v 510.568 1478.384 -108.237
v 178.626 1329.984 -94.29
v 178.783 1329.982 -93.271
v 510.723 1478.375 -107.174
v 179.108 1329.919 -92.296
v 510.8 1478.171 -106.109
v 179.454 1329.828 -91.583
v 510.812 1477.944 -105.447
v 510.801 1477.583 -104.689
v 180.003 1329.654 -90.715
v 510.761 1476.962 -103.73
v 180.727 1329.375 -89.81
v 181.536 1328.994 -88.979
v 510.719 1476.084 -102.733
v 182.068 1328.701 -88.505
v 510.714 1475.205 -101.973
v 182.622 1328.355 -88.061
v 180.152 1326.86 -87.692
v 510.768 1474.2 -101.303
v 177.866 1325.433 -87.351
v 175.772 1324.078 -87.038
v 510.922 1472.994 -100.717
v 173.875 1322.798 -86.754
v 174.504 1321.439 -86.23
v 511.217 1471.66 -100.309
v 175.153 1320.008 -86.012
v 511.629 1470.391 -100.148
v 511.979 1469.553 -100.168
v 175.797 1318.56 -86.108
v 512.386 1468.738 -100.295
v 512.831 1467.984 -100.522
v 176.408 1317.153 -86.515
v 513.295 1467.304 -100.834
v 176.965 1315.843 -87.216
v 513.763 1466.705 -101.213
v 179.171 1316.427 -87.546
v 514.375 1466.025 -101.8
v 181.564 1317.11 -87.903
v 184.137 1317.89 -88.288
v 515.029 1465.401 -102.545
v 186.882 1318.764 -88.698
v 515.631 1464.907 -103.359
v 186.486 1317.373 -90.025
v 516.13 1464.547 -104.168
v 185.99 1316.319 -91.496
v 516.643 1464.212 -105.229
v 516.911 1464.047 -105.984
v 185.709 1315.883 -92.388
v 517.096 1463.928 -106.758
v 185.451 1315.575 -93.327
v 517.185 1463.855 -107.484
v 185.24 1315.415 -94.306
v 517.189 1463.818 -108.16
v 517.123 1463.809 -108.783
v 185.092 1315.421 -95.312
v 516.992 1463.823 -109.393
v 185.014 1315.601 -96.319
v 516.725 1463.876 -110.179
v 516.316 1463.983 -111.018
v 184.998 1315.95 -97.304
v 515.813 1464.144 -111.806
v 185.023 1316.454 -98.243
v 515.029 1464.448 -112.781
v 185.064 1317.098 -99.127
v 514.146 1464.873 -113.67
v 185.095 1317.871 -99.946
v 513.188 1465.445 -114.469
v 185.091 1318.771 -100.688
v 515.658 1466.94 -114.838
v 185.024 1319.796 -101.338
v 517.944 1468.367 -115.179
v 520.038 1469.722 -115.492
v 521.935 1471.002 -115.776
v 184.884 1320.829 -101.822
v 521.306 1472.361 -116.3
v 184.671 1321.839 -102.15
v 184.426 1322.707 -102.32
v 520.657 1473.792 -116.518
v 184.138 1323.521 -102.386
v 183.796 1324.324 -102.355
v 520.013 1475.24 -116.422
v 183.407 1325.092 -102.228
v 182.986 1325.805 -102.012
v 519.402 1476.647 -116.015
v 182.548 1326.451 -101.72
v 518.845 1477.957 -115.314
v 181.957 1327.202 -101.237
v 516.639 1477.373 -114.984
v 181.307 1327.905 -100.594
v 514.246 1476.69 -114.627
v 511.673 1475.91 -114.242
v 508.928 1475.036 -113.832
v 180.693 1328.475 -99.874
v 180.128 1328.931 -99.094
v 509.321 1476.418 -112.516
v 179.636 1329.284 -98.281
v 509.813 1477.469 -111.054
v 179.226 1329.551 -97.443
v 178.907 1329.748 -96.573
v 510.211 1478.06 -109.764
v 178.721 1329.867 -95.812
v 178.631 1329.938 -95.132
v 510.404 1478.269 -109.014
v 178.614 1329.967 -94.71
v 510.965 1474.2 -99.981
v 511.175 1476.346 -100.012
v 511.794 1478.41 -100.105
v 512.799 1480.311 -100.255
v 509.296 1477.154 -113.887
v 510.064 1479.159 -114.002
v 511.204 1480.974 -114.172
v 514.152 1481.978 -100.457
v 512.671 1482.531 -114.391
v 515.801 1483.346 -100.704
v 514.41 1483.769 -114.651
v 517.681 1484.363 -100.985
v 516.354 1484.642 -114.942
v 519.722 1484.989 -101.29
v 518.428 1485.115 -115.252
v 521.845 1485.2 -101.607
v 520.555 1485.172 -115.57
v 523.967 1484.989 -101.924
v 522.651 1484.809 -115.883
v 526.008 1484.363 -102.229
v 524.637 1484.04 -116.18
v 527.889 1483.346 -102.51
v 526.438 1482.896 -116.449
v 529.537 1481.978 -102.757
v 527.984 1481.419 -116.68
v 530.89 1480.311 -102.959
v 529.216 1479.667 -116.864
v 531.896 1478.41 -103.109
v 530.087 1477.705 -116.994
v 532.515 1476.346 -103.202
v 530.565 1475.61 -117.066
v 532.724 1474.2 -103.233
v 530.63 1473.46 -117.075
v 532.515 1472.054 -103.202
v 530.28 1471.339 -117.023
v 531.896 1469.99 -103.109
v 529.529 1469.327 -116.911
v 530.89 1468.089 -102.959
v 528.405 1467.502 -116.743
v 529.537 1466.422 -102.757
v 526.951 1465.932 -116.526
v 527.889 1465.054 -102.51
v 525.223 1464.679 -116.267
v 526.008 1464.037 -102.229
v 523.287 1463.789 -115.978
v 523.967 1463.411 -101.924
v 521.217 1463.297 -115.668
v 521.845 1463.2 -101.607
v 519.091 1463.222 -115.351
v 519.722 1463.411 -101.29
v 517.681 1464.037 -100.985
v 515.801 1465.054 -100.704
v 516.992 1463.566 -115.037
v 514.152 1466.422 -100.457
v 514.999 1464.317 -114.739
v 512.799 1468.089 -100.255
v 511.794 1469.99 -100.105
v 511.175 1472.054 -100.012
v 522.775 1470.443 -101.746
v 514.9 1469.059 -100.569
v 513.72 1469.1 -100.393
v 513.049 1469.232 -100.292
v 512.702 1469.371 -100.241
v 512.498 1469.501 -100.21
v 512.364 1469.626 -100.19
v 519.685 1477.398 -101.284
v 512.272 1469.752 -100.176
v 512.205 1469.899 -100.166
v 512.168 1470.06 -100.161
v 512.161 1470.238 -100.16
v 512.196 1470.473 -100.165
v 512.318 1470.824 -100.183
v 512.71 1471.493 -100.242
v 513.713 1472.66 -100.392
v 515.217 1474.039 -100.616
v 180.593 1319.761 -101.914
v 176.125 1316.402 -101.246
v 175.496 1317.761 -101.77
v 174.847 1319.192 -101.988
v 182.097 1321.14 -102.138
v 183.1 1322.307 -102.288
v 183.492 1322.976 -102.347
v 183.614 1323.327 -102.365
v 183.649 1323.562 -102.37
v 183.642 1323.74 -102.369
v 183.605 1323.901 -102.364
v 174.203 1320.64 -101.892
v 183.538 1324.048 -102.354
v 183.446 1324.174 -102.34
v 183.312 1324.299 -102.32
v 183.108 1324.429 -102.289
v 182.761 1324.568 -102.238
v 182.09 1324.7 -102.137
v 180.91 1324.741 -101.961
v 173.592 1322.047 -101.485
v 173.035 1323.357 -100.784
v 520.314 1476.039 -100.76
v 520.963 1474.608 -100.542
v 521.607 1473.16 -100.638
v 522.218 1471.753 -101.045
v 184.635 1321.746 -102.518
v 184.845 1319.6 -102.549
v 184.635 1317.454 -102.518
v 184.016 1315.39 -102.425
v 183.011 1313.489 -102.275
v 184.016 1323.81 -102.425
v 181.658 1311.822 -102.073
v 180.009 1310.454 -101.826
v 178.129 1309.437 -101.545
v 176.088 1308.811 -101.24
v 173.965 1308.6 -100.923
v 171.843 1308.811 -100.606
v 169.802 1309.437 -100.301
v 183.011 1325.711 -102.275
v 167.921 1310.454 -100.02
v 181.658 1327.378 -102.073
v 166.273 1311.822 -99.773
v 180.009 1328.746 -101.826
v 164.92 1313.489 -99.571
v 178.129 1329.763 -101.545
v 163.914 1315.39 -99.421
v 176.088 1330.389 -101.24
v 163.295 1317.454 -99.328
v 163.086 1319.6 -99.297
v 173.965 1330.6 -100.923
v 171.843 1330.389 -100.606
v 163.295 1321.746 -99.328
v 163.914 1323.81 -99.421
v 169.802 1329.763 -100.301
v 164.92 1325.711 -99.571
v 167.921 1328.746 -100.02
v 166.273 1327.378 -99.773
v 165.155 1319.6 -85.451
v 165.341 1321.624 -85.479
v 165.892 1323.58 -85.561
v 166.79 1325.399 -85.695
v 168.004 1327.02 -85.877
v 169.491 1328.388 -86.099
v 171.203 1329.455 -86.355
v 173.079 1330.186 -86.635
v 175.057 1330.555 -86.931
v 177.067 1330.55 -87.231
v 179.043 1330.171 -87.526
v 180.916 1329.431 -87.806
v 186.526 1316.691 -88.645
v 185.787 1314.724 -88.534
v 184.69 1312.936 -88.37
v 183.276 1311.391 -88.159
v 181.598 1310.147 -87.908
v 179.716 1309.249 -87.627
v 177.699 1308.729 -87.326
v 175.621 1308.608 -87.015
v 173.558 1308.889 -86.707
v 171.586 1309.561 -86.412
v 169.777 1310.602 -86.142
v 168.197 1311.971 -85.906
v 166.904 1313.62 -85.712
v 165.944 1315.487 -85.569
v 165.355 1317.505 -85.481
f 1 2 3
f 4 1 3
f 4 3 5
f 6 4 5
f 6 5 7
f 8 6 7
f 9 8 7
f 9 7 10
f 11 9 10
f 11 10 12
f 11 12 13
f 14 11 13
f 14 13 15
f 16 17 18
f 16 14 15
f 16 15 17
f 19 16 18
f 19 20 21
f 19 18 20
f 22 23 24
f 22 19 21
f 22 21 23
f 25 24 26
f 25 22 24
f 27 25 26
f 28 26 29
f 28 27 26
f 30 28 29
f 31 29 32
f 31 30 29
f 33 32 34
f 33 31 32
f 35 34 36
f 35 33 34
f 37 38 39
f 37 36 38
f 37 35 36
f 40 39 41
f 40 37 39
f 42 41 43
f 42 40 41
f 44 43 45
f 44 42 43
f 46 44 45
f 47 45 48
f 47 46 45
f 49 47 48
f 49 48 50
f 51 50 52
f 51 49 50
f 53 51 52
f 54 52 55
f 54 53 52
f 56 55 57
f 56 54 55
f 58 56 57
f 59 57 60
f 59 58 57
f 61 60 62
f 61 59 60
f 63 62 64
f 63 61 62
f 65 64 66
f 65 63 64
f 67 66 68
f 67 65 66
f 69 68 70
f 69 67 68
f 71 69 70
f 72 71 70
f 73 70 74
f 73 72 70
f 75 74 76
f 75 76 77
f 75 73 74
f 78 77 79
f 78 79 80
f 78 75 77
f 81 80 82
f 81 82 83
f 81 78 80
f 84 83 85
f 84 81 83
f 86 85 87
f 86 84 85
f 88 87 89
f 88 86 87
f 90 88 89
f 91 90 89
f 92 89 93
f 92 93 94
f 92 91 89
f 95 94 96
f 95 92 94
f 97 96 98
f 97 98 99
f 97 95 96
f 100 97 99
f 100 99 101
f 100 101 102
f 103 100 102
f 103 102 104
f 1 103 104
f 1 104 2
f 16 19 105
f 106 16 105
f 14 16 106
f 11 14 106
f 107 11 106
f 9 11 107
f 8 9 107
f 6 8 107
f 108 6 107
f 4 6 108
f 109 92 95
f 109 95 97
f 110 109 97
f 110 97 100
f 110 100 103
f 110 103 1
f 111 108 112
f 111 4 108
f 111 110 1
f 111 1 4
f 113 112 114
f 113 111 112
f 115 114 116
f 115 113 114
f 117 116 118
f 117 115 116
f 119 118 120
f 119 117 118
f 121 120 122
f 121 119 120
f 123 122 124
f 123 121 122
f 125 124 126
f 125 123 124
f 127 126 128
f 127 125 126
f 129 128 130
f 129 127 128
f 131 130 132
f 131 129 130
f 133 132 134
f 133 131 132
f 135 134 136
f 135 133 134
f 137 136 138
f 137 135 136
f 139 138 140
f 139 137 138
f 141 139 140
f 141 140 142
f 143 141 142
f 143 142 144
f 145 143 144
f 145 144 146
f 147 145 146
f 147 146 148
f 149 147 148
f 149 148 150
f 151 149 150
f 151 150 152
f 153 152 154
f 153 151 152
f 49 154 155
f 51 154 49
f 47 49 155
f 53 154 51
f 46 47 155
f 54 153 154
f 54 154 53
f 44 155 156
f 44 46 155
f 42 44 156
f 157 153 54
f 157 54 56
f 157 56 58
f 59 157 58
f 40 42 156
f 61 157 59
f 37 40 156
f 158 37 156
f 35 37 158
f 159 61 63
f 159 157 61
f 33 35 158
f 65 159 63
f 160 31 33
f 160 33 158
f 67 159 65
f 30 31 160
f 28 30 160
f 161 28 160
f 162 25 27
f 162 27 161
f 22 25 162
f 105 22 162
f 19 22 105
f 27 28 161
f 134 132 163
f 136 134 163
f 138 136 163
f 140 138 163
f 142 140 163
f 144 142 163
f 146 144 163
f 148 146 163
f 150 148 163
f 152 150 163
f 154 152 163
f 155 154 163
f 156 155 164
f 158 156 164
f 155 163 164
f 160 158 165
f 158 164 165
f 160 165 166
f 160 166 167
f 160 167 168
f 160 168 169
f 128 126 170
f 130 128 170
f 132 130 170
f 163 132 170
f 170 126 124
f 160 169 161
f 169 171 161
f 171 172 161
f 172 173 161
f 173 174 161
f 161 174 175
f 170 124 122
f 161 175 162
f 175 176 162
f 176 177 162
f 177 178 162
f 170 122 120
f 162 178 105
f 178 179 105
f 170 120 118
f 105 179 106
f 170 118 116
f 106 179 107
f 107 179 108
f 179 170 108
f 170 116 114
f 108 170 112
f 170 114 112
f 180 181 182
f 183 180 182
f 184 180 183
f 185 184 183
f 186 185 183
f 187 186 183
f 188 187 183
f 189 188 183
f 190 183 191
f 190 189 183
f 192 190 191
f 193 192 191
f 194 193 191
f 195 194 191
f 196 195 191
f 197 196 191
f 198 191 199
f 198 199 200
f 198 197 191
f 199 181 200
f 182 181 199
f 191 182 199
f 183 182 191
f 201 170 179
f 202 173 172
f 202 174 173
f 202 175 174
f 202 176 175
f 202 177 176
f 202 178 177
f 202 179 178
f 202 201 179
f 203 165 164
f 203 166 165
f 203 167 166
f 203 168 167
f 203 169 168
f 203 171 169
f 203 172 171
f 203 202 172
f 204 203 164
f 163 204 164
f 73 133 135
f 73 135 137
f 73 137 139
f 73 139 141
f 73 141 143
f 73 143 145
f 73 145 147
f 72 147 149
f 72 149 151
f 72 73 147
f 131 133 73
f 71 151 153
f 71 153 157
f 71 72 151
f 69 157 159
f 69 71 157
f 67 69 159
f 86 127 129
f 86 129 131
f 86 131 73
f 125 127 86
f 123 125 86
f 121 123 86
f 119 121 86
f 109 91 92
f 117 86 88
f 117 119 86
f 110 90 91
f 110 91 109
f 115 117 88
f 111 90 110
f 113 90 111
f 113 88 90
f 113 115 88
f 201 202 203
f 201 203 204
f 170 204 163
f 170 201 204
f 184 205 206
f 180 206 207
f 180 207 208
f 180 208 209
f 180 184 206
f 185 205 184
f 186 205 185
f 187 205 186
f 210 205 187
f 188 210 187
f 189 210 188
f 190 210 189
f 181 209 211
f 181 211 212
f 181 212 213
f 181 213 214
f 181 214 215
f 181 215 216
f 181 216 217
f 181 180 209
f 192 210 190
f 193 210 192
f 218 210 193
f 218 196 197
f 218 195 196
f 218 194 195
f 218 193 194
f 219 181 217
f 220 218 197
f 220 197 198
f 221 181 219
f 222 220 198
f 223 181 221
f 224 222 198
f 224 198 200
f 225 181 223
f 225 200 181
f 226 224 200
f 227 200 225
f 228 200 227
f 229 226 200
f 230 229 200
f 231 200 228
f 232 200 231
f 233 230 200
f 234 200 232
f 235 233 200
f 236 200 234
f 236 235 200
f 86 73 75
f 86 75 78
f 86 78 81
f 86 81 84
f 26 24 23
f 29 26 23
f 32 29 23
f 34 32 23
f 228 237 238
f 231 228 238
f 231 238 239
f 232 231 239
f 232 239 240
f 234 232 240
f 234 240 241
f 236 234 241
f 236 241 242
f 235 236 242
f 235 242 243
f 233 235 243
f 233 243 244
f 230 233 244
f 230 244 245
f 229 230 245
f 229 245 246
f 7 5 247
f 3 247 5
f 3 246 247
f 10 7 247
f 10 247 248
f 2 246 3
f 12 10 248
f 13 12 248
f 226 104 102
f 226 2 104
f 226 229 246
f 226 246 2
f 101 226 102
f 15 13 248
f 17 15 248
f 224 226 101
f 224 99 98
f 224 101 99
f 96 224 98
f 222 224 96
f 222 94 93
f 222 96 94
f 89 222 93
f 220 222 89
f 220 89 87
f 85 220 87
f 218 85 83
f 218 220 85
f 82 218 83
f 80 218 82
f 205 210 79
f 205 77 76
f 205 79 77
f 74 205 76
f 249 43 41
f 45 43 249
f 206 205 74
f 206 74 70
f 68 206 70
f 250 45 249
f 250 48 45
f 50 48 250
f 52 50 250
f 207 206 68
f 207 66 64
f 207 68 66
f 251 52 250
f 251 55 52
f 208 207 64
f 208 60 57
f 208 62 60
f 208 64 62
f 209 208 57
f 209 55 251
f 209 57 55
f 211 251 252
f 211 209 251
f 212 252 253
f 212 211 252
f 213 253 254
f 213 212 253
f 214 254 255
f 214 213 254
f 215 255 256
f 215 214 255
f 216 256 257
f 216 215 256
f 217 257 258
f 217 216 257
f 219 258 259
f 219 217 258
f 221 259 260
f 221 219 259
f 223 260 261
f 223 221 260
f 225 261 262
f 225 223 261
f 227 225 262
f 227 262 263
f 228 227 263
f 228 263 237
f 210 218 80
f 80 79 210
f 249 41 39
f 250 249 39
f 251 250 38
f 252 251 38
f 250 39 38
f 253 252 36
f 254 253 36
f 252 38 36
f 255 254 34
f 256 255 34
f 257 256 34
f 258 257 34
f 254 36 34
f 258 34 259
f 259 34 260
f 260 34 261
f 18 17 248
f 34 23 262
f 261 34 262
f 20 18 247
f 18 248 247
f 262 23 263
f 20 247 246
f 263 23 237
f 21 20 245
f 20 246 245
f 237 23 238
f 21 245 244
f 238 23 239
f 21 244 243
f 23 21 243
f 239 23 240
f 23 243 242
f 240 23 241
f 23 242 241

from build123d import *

# Parameters (mm, degrees)
SUSP_RR_TOE_LINK_PROFILE_R             = 8
SUSP_RR_TOE_LINK_ROD_END_IN_PROFILE_R  = 11
SUSP_RR_TOE_LINK_ROD_END_OUT_PROFILE_R = 11


with BuildPart() as part:
    # SUSP_RR_toe_link: sweep along a curve in space
    with BuildLine() as susp_rr_toe_link_path:
        Line((175, 1319.6, -94), (520.81, 1474.2, -108.53))
    # SUSP_RR_toe_link profile (on start of the path) → SUSP_RR_toe_link (sweep)
    with BuildSketch(Plane(origin=(175, 1319.6, -94), x_dir=(-0.40813623590833575, 0.9129210332436072, 0), z_dir=(0.9122501501575765, 0.4078363066839052, -0.03833028160489745))):
        Circle(SUSP_RR_TOE_LINK_PROFILE_R)
    sweep(path=susp_rr_toe_link_path.line)

    # SUSP_RR_toe_link_rod_end_in: sweep along a curve in space
    with BuildLine() as susp_rr_toe_link_rod_end_in_path:
        Line((176.034666, 1319.6, -87.076889), (173.965334, 1319.6, -100.923111))
    # SUSP_RR_toe_link_rod_end_in profile (on start of the path) → SUSP_RR_toe_link_rod_end_in (sweep)
    with BuildSketch(Plane(origin=(176.034666, 1319.6, -87.076889), x_dir=(-0.989015860676298, 0, 0.14780942909950529), z_dir=(-0.14780942909950529, 0, -0.989015860676298))):
        Circle(SUSP_RR_TOE_LINK_ROD_END_IN_PROFILE_R)
    sweep(path=susp_rr_toe_link_rod_end_in_path.line)

    # SUSP_RR_toe_link_rod_end_out: sweep along a curve in space
    with BuildLine() as susp_rr_toe_link_rod_end_out_path:
        Line((521.844666, 1474.2, -101.606889), (519.775334, 1474.2, -115.453111))
    # SUSP_RR_toe_link_rod_end_out profile (on start of the path) → SUSP_RR_toe_link_rod_end_out (sweep)
    with BuildSketch(Plane(origin=(521.844666, 1474.2, -101.606889), x_dir=(-0.9890158606762977, 0, 0.14780942909950728), z_dir=(-0.14780942909950728, 0, -0.9890158606762977))):
        Circle(SUSP_RR_TOE_LINK_ROD_END_OUT_PROFILE_R)
    sweep(path=susp_rr_toe_link_rod_end_out_path.line)


solid = part.part
